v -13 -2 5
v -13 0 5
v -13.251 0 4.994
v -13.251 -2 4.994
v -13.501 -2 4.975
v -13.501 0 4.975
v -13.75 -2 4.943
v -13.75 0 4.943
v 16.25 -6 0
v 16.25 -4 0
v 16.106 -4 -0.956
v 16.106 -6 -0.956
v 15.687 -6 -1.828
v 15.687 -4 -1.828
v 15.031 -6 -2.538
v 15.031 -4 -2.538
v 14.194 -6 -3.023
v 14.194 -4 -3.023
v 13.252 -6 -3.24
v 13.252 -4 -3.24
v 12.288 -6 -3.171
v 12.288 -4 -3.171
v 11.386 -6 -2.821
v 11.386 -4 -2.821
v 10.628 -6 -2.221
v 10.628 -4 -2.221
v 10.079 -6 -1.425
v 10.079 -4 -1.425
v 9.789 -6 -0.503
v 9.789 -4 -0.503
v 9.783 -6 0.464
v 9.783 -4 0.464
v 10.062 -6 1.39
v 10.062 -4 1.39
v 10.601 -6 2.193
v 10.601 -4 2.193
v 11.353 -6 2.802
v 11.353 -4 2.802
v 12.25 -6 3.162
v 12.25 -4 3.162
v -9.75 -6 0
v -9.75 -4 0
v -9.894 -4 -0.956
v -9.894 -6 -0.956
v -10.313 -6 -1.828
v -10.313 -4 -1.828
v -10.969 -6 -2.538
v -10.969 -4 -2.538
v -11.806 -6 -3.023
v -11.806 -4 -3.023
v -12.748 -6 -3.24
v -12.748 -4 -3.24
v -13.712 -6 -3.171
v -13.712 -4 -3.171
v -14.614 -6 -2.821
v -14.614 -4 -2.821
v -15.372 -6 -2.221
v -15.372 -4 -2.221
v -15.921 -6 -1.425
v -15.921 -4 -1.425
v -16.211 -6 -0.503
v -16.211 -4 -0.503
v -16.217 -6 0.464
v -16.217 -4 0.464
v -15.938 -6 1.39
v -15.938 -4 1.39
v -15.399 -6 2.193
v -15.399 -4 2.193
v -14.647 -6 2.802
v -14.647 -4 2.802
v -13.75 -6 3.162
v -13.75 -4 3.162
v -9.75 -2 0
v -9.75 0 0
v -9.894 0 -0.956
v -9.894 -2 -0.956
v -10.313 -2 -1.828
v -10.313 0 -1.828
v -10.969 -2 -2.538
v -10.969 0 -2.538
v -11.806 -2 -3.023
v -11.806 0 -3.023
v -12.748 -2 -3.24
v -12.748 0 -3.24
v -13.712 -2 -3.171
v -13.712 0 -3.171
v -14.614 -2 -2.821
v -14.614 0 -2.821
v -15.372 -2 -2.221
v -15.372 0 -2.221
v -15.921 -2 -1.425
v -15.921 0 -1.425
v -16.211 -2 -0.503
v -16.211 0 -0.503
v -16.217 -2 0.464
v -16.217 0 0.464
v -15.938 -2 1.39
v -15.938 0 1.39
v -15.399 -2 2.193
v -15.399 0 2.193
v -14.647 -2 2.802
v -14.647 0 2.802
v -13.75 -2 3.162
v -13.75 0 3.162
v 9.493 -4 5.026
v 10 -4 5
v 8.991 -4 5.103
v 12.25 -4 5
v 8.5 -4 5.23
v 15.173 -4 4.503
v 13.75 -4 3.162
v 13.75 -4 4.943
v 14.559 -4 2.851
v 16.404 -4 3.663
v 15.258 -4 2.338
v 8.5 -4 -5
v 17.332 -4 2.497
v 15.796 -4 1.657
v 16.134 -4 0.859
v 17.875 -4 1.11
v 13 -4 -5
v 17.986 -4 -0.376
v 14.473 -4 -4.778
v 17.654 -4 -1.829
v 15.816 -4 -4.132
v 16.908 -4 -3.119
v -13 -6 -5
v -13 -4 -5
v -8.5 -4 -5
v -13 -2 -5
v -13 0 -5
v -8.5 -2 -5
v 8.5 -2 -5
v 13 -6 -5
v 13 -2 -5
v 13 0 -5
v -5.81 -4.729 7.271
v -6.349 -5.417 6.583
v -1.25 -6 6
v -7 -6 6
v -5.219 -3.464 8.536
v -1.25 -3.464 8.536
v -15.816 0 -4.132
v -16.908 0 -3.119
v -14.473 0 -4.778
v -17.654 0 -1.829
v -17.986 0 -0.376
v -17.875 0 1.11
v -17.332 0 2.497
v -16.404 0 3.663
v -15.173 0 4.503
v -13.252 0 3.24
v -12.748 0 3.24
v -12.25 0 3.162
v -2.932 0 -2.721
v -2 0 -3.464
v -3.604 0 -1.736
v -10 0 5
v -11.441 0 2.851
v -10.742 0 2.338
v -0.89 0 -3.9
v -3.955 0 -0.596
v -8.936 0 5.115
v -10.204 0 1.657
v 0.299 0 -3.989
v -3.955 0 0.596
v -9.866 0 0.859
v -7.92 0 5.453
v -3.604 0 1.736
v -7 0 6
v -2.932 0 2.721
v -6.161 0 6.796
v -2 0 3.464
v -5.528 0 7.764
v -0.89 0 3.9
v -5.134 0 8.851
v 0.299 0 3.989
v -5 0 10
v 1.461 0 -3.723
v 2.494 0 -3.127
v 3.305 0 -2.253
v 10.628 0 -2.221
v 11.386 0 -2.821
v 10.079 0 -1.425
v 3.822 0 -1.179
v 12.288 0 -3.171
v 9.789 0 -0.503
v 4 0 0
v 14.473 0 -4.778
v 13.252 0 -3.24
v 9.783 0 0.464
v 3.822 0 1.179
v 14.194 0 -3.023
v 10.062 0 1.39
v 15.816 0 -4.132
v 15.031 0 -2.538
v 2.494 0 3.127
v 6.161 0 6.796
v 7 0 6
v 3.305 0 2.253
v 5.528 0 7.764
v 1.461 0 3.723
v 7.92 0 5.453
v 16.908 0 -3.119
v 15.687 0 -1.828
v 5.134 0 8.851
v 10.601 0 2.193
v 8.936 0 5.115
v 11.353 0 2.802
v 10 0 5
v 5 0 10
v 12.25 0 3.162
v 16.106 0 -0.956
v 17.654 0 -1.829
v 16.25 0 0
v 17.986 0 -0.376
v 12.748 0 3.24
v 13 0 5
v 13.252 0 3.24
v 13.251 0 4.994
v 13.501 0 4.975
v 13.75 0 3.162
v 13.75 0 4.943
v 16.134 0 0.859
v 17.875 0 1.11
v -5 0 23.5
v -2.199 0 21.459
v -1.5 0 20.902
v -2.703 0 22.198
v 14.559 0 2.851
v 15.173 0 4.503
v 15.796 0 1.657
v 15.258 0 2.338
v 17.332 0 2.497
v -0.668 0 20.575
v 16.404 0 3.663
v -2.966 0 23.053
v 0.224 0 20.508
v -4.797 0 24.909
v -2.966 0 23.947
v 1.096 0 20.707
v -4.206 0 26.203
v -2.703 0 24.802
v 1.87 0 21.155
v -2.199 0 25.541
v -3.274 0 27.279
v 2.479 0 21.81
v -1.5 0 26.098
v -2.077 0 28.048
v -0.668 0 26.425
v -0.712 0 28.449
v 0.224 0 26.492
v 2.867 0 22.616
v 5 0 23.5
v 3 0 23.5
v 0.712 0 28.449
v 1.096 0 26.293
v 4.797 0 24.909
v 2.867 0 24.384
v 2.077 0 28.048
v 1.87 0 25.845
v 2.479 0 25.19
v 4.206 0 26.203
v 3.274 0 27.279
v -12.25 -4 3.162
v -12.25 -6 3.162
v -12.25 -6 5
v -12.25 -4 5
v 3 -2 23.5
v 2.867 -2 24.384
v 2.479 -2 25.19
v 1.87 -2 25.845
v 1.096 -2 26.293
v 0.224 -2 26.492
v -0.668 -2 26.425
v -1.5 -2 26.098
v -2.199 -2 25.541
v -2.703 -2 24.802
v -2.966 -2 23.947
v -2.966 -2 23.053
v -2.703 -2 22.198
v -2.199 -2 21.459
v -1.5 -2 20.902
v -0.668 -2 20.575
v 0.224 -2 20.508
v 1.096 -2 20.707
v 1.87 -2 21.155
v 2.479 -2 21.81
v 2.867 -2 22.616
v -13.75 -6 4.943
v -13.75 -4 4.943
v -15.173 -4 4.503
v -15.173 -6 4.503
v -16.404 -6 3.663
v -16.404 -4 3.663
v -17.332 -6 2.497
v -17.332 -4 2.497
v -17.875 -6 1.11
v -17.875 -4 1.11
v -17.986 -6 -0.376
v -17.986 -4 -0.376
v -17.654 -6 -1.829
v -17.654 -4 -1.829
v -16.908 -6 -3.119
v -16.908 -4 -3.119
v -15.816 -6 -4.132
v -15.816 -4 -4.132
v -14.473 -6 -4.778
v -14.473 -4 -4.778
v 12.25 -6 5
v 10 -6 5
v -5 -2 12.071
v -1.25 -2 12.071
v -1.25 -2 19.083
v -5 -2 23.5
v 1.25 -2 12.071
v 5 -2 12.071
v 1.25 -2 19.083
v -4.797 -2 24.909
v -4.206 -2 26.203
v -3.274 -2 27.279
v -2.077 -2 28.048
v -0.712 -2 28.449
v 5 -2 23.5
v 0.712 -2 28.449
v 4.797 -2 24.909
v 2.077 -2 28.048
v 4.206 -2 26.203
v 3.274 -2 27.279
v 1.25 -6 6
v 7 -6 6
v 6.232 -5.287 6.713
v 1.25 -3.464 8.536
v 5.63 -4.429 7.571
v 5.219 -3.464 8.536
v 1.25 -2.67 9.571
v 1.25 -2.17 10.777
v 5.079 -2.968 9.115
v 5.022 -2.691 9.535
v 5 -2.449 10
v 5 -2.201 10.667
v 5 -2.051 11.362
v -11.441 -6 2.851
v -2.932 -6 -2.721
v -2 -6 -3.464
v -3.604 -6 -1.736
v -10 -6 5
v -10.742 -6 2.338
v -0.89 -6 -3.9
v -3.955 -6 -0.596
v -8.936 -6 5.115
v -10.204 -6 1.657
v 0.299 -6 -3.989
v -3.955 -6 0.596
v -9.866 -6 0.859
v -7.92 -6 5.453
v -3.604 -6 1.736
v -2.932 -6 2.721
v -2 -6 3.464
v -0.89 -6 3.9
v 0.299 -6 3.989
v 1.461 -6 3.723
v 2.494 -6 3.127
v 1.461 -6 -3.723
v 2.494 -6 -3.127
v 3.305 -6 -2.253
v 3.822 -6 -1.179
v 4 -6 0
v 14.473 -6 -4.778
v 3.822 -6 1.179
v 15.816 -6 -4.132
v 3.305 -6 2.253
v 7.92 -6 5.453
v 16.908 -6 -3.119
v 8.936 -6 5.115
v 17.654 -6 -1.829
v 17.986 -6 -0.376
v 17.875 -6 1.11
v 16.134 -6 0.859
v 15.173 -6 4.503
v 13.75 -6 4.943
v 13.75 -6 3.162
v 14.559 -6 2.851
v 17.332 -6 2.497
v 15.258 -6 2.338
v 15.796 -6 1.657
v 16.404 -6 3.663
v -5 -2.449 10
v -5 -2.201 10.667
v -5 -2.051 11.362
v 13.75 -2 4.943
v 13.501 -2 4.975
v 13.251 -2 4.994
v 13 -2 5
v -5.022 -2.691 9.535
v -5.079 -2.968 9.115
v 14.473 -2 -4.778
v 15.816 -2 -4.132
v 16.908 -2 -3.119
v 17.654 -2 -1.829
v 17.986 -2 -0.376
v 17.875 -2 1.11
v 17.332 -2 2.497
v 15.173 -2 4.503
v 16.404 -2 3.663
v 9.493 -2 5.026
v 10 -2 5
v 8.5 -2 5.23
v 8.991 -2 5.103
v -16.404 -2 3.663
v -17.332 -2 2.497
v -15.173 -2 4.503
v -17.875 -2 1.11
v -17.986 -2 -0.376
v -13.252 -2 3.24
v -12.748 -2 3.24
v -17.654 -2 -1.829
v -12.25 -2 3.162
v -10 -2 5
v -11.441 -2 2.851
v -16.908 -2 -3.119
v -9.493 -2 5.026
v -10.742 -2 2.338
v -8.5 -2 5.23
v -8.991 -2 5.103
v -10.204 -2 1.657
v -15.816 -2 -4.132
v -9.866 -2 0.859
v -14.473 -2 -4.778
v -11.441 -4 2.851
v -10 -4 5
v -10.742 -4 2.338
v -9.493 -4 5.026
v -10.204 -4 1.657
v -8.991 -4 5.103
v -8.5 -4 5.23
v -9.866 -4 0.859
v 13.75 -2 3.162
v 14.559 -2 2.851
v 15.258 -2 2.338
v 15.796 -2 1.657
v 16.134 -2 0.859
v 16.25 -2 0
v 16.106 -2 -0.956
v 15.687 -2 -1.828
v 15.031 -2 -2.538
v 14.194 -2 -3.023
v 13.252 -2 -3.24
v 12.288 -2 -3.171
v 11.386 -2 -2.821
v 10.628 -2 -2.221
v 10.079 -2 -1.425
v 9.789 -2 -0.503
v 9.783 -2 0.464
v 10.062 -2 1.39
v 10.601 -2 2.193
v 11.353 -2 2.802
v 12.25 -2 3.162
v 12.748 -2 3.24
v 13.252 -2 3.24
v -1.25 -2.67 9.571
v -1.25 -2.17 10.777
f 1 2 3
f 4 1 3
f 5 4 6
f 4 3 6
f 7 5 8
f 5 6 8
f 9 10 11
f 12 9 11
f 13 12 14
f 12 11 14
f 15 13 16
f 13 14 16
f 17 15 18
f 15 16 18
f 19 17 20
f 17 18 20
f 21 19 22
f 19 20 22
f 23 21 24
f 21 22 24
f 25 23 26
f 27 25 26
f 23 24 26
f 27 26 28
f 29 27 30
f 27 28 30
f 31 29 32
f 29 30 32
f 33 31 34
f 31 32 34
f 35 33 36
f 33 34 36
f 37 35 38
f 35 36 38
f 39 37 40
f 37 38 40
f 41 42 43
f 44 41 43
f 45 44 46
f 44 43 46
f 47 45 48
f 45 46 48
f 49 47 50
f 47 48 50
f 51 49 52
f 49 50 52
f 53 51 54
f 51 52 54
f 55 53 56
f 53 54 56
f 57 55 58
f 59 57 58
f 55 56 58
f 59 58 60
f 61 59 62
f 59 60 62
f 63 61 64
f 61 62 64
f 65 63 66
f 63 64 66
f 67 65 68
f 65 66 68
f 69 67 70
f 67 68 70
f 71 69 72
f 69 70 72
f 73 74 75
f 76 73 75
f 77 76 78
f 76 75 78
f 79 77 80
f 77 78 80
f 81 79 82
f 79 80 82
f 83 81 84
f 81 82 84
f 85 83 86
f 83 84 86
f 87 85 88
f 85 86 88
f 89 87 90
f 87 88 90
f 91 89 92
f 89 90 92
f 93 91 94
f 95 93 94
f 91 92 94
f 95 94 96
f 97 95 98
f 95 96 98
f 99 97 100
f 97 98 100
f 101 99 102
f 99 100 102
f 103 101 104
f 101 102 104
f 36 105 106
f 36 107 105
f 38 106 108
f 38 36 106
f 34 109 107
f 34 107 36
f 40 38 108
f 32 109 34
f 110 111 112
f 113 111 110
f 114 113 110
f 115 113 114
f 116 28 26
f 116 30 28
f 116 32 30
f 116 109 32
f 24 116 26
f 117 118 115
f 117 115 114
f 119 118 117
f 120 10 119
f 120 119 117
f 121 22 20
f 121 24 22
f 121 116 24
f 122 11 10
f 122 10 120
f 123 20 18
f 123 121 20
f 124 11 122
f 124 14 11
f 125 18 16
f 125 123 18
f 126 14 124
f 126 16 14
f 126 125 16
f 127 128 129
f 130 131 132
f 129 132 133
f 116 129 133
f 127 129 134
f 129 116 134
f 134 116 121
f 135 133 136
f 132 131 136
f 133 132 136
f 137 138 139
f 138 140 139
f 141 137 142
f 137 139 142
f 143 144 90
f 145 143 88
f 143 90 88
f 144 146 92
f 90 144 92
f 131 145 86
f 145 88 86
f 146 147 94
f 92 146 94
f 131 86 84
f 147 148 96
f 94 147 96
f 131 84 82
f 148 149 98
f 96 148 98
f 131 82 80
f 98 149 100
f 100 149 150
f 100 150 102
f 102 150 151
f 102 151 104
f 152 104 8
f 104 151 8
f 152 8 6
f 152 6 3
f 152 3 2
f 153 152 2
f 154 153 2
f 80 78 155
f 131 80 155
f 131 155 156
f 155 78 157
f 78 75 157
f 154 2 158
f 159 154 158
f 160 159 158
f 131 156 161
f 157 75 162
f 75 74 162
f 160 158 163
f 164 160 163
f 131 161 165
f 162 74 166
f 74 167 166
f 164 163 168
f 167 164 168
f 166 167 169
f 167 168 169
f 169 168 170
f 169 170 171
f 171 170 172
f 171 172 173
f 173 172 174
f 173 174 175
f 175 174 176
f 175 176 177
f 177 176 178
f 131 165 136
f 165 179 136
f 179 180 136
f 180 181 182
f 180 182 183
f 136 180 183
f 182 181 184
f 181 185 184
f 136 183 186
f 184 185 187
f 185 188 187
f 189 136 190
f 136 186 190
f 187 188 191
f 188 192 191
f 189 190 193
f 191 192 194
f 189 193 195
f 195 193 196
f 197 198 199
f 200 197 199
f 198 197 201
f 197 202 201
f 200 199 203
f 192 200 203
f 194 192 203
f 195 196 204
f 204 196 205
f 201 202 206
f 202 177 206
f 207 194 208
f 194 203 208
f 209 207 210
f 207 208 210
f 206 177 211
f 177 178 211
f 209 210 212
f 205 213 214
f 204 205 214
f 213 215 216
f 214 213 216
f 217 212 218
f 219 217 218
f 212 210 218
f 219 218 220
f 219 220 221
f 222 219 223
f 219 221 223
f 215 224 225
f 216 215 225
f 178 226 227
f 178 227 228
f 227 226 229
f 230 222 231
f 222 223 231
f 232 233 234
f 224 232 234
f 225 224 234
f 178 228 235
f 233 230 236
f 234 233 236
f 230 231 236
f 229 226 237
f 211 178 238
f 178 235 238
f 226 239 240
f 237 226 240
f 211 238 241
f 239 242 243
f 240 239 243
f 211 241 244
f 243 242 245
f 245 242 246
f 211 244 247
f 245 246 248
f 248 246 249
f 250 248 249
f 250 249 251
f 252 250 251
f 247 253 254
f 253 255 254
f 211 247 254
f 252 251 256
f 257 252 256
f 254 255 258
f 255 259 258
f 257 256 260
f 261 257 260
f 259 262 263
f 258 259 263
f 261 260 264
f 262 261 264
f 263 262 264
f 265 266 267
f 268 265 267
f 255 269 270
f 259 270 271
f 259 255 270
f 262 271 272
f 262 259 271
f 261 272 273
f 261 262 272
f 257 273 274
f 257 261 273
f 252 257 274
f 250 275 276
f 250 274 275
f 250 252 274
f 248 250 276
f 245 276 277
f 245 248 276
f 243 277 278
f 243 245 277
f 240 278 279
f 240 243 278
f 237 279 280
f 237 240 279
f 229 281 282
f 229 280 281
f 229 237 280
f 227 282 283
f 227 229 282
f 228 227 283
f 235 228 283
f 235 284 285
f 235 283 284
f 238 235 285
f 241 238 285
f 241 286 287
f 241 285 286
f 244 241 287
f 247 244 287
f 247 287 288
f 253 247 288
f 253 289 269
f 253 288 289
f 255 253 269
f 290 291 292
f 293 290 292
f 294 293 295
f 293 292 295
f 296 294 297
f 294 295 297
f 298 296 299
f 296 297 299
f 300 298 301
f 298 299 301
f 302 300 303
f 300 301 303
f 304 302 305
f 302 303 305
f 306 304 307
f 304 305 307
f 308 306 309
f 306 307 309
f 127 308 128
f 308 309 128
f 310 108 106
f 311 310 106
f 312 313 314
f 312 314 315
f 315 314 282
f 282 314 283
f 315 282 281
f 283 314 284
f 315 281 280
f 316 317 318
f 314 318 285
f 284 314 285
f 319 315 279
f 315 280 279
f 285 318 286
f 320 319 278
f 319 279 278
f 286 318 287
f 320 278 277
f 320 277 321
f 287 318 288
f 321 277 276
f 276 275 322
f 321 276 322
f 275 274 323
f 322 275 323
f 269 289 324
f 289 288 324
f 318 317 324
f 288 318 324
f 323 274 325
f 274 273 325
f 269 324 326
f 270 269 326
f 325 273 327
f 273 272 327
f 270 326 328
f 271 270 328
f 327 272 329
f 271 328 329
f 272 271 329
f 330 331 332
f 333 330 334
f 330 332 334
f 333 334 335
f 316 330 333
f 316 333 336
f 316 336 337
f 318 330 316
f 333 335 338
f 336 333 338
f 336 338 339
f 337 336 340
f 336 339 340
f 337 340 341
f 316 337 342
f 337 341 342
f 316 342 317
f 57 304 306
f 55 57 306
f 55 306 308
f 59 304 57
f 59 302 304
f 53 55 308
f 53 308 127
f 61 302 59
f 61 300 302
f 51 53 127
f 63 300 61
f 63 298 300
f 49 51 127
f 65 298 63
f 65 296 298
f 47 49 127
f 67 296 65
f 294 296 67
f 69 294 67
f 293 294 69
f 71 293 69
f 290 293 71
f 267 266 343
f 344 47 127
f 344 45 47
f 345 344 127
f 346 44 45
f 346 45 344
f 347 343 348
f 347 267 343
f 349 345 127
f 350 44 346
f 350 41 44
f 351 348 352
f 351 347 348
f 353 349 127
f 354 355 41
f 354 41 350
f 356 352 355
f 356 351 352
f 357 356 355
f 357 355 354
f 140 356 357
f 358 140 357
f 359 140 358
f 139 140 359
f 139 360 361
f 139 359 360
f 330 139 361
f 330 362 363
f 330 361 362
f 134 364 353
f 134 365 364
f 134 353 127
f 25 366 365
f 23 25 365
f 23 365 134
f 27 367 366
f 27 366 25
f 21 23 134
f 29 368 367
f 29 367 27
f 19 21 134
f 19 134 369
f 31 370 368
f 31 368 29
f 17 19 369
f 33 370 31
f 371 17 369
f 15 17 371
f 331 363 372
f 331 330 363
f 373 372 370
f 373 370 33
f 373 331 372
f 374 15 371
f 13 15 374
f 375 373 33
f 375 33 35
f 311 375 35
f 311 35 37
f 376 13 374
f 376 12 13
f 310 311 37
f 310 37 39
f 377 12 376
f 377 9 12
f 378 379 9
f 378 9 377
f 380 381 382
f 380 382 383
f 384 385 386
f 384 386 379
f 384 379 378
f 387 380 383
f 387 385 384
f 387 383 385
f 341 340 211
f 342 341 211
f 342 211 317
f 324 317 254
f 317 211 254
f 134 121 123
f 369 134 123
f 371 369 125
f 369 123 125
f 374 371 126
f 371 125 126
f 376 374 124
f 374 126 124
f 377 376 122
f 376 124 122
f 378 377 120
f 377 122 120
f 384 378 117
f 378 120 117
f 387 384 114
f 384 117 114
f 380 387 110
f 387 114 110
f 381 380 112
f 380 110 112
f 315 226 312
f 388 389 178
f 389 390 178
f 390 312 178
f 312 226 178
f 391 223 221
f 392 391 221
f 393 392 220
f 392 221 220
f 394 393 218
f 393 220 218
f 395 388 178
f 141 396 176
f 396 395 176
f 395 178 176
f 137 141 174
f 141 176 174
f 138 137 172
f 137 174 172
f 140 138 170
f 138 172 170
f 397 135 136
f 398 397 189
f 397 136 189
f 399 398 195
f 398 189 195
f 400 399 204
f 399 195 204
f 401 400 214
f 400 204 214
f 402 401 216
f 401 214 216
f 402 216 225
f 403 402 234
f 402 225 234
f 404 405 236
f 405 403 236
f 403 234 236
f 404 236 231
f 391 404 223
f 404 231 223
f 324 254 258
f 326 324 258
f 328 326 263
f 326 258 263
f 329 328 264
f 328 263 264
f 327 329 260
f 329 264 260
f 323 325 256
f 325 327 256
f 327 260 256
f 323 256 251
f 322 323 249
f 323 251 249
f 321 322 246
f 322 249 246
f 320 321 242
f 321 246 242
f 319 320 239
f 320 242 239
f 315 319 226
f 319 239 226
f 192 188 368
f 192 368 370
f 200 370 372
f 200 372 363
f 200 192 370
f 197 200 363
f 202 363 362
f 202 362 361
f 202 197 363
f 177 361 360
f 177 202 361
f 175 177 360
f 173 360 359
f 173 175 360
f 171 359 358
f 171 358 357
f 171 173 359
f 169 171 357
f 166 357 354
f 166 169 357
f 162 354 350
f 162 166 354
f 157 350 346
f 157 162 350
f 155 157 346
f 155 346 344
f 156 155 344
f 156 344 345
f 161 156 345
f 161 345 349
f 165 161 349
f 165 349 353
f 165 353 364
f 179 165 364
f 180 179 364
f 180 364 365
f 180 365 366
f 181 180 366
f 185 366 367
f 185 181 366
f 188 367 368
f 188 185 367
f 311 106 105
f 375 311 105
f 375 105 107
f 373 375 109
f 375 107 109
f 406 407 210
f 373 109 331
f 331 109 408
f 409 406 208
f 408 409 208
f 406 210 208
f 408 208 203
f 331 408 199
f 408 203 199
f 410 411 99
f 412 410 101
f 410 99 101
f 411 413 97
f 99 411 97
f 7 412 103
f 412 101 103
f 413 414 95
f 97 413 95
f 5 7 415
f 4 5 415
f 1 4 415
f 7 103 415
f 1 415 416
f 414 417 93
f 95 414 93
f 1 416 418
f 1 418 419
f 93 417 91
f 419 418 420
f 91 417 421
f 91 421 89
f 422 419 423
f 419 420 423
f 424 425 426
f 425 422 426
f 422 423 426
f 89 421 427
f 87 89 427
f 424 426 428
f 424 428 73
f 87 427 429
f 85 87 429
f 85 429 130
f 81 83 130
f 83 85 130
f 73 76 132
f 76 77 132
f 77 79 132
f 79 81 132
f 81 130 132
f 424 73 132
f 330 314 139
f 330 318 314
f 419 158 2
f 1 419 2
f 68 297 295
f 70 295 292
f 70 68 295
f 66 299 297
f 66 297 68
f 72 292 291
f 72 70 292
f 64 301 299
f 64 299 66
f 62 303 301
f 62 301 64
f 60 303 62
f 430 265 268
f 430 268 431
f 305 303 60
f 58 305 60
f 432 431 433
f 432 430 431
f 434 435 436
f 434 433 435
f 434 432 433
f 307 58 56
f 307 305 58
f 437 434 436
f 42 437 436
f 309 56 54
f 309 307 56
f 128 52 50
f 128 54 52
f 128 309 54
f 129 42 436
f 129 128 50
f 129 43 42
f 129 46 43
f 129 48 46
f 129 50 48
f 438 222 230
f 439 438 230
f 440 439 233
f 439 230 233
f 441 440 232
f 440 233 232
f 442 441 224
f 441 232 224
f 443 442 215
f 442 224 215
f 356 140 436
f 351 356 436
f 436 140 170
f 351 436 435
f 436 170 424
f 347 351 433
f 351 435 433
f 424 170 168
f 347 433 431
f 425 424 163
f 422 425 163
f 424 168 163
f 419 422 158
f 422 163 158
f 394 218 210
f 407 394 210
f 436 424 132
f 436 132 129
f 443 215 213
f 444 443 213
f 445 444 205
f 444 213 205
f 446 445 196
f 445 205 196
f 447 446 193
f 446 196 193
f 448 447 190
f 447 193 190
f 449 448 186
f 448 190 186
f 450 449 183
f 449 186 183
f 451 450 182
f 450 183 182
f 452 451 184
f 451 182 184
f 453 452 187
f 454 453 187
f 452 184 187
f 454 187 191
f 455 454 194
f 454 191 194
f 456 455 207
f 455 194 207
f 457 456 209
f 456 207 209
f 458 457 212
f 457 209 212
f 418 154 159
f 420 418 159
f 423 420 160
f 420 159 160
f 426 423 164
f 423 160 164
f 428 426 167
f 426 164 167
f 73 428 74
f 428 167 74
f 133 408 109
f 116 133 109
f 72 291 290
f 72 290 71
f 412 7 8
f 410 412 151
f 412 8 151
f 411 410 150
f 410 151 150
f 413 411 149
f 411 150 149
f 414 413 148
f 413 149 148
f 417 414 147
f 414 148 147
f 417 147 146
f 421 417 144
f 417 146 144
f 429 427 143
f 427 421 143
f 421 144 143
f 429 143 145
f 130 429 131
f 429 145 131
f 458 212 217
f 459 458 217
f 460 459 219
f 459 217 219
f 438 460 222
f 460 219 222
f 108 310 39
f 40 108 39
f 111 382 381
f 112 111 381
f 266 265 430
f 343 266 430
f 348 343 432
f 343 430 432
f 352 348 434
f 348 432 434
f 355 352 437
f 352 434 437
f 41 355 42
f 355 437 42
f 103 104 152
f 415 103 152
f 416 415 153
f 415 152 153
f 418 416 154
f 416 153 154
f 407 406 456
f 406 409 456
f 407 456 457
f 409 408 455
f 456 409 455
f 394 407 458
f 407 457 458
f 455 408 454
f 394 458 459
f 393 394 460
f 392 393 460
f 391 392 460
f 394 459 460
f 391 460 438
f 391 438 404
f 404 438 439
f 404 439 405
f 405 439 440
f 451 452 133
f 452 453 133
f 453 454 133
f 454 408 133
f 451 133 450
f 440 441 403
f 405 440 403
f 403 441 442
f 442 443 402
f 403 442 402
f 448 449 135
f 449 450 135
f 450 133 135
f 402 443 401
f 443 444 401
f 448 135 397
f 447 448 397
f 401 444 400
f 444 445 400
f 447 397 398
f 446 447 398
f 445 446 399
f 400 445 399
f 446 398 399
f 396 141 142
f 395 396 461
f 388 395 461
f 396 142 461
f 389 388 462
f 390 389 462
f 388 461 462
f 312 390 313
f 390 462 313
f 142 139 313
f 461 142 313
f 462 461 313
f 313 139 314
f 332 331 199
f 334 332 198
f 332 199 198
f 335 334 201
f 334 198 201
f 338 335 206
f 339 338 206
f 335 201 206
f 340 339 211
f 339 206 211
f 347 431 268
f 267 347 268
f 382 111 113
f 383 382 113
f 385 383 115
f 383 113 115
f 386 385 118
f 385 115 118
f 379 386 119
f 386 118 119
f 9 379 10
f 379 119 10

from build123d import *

# Parameters (mm, degrees)
F0_R     = 4
F0_R_2   = 3
F1_DEPTH = 6
F3_DEPTH = 12.5
F5_DEPTH = 1.25
F6_W     = 9.5
F6_H     = 2
F7_DEPTH = 25
F9_DEPTH = 3


with BuildPart() as f1:
    # F0 (on Front) → F1 (new body)
    with BuildSketch(Plane.XZ):
        with BuildLine():
            ThreePointArc((-12.25, 3.162278), (-10.45049, 2.015564), (-9.75, 0))
            ThreePointArc((-9.75, 0), (-15.015564, -2.54951), (-13.75, 3.162278))
            Line((-13.75, 3.162278), (-13.75, 4.94343))
            ThreePointArc((-13.75, 4.94343), (-17.985837, -0.376065), (-13, -5))
            Line((-13, -5), (13, -5))
            ThreePointArc((13, -5), (17.985837, -0.376065), (13.75, 4.94343))
            Line((13.75, 4.94343), (13.75, 3.162278))
            ThreePointArc((13.75, 3.162278), (15.54951, 2.015564), (16.25, 0))
            ThreePointArc((16.25, 0), (10.984436, -2.54951), (12.25, 3.162278))
            Line((12.25, 3.162278), (12.25, 5))
            Line((12.25, 5), (10, 5))
            ThreePointArc((10, 5), (8.418861, 5.256584), (7, 6))
            Line((7, 6), (1.25, 6))
            Line((1.25, 6), (-1.25, 6))
            Line((-1.25, 6), (-7, 6))
            ThreePointArc((-7, 6), (-8.418861, 5.256584), (-10, 5))
            Line((-10, 5), (-12.25, 5))
            Line((-12.25, 5), (-12.25, 3.162278))
        make_face()
        Circle(F0_R, mode=Mode.SUBTRACT)
        with BuildLine():
            ThreePointArc((-13.75, 3.162278), (-13, 3.25), (-12.25, 3.162278))
            Line((-12.25, 3.162278), (-12.25, 5))
            Line((-12.25, 5), (-13, 5))
            ThreePointArc((-13, 5), (-13.376065, 4.985837), (-13.75, 4.94343))
            Line((-13.75, 4.94343), (-13.75, 3.162278))
        make_face()
        with BuildLine():
            ThreePointArc((-5, 10), (-5.527864, 7.763932), (-7, 6))
            Line((-7, 6), (-1.25, 6))
            Line((-1.25, 6), (-1.25, 19))
            Line((-1.25, 19), (1.25, 19))
            Line((1.25, 19), (1.25, 6))
            Line((1.25, 6), (7, 6))
            ThreePointArc((7, 6), (5.527864, 7.763932), (5, 10))
            Line((5, 10), (5, 23.5))
            ThreePointArc((5, 23.5), (0, 28.5), (-5, 23.5))
            Line((-5, 23.5), (-5, 10))
        make_face()
        with Locations((0, 23.5)):
            Circle(F0_R_2, mode=Mode.SUBTRACT)
        with BuildLine():
            Line((13.75, 3.162278), (13.75, 4.94343))
            ThreePointArc((13.75, 4.94343), (13.376065, 4.985837), (13, 5))
            Line((13, 5), (12.25, 5))
            Line((12.25, 5), (12.25, 3.162278))
            ThreePointArc((12.25, 3.162278), (13, 3.25), (13.75, 3.162278))
        make_face()
    extrude(amount=F1_DEPTH)

    # F2 (on Right) → F3 (cut, symmetric)
    with BuildSketch(Plane.YZ):
        Polygon((-2, 19.08341), (-2, 28.5), (-6, 28.5), (-6, 6), align=None)
        with BuildLine():
            Line((-2, 12.071068), (-2, 19.08341))
            Line((-2, 19.08341), (-6, 6))
            Line((-6, 6), (-3.464466, 8.535534))
            ThreePointArc((-3.464466, 8.535534), (-2.380602, 10.157651), (-2, 12.071068))
        make_face()
    extrude(amount=F3_DEPTH, both=True, mode=Mode.SUBTRACT)

    # F4 (on Right) → F5 (join, symmetric)
    with BuildSketch(Plane.YZ):
        Polygon((-2, 19.08341), (-6, 6), (0, 6), (0, 19.08341), align=None)
    extrude(amount=F5_DEPTH, both=True)

    # F6 (on face) → F7 (cut)
    with BuildSketch(Plane(origin=(0, 0, -5), x_dir=(1, 0, 0), z_dir=(0, 0, -1))):
        with Locations((-13.25, 3)):
            Rectangle(F6_W, F6_H)
        with Locations((13.25, 3)):
            Rectangle(F6_W, F6_H)
    extrude(amount=-F7_DEPTH, mode=Mode.SUBTRACT)

    # F8 (on face) → F9 (cut)
    with BuildSketch(Plane.XZ.offset(6)):
        with BuildLine():
            Line((-12.25, 3.162278), (-12.25, 5))
            Line((-12.25, 5), (-13, 5))
            ThreePointArc((-13, 5), (-13.376065, 4.985837), (-13.75, 4.94343))
            Line((-13.75, 4.94343), (-13.75, 3.162278))
            ThreePointArc((-13.75, 3.162278), (-13, 3.25), (-12.25, 3.162278))
        make_face()
        with BuildLine():
            Line((13, 5), (12.25, 5))
            Line((12.25, 5), (12.25, 3.162278))
            ThreePointArc((12.25, 3.162278), (13, 3.25), (13.75, 3.162278))
            Line((13.75, 3.162278), (13.75, 4.94343))
            ThreePointArc((13.75, 4.94343), (13.376065, 4.985837), (13, 5))
        make_face()
    extrude(amount=-F9_DEPTH, mode=Mode.SUBTRACT)


solid = f1.part
